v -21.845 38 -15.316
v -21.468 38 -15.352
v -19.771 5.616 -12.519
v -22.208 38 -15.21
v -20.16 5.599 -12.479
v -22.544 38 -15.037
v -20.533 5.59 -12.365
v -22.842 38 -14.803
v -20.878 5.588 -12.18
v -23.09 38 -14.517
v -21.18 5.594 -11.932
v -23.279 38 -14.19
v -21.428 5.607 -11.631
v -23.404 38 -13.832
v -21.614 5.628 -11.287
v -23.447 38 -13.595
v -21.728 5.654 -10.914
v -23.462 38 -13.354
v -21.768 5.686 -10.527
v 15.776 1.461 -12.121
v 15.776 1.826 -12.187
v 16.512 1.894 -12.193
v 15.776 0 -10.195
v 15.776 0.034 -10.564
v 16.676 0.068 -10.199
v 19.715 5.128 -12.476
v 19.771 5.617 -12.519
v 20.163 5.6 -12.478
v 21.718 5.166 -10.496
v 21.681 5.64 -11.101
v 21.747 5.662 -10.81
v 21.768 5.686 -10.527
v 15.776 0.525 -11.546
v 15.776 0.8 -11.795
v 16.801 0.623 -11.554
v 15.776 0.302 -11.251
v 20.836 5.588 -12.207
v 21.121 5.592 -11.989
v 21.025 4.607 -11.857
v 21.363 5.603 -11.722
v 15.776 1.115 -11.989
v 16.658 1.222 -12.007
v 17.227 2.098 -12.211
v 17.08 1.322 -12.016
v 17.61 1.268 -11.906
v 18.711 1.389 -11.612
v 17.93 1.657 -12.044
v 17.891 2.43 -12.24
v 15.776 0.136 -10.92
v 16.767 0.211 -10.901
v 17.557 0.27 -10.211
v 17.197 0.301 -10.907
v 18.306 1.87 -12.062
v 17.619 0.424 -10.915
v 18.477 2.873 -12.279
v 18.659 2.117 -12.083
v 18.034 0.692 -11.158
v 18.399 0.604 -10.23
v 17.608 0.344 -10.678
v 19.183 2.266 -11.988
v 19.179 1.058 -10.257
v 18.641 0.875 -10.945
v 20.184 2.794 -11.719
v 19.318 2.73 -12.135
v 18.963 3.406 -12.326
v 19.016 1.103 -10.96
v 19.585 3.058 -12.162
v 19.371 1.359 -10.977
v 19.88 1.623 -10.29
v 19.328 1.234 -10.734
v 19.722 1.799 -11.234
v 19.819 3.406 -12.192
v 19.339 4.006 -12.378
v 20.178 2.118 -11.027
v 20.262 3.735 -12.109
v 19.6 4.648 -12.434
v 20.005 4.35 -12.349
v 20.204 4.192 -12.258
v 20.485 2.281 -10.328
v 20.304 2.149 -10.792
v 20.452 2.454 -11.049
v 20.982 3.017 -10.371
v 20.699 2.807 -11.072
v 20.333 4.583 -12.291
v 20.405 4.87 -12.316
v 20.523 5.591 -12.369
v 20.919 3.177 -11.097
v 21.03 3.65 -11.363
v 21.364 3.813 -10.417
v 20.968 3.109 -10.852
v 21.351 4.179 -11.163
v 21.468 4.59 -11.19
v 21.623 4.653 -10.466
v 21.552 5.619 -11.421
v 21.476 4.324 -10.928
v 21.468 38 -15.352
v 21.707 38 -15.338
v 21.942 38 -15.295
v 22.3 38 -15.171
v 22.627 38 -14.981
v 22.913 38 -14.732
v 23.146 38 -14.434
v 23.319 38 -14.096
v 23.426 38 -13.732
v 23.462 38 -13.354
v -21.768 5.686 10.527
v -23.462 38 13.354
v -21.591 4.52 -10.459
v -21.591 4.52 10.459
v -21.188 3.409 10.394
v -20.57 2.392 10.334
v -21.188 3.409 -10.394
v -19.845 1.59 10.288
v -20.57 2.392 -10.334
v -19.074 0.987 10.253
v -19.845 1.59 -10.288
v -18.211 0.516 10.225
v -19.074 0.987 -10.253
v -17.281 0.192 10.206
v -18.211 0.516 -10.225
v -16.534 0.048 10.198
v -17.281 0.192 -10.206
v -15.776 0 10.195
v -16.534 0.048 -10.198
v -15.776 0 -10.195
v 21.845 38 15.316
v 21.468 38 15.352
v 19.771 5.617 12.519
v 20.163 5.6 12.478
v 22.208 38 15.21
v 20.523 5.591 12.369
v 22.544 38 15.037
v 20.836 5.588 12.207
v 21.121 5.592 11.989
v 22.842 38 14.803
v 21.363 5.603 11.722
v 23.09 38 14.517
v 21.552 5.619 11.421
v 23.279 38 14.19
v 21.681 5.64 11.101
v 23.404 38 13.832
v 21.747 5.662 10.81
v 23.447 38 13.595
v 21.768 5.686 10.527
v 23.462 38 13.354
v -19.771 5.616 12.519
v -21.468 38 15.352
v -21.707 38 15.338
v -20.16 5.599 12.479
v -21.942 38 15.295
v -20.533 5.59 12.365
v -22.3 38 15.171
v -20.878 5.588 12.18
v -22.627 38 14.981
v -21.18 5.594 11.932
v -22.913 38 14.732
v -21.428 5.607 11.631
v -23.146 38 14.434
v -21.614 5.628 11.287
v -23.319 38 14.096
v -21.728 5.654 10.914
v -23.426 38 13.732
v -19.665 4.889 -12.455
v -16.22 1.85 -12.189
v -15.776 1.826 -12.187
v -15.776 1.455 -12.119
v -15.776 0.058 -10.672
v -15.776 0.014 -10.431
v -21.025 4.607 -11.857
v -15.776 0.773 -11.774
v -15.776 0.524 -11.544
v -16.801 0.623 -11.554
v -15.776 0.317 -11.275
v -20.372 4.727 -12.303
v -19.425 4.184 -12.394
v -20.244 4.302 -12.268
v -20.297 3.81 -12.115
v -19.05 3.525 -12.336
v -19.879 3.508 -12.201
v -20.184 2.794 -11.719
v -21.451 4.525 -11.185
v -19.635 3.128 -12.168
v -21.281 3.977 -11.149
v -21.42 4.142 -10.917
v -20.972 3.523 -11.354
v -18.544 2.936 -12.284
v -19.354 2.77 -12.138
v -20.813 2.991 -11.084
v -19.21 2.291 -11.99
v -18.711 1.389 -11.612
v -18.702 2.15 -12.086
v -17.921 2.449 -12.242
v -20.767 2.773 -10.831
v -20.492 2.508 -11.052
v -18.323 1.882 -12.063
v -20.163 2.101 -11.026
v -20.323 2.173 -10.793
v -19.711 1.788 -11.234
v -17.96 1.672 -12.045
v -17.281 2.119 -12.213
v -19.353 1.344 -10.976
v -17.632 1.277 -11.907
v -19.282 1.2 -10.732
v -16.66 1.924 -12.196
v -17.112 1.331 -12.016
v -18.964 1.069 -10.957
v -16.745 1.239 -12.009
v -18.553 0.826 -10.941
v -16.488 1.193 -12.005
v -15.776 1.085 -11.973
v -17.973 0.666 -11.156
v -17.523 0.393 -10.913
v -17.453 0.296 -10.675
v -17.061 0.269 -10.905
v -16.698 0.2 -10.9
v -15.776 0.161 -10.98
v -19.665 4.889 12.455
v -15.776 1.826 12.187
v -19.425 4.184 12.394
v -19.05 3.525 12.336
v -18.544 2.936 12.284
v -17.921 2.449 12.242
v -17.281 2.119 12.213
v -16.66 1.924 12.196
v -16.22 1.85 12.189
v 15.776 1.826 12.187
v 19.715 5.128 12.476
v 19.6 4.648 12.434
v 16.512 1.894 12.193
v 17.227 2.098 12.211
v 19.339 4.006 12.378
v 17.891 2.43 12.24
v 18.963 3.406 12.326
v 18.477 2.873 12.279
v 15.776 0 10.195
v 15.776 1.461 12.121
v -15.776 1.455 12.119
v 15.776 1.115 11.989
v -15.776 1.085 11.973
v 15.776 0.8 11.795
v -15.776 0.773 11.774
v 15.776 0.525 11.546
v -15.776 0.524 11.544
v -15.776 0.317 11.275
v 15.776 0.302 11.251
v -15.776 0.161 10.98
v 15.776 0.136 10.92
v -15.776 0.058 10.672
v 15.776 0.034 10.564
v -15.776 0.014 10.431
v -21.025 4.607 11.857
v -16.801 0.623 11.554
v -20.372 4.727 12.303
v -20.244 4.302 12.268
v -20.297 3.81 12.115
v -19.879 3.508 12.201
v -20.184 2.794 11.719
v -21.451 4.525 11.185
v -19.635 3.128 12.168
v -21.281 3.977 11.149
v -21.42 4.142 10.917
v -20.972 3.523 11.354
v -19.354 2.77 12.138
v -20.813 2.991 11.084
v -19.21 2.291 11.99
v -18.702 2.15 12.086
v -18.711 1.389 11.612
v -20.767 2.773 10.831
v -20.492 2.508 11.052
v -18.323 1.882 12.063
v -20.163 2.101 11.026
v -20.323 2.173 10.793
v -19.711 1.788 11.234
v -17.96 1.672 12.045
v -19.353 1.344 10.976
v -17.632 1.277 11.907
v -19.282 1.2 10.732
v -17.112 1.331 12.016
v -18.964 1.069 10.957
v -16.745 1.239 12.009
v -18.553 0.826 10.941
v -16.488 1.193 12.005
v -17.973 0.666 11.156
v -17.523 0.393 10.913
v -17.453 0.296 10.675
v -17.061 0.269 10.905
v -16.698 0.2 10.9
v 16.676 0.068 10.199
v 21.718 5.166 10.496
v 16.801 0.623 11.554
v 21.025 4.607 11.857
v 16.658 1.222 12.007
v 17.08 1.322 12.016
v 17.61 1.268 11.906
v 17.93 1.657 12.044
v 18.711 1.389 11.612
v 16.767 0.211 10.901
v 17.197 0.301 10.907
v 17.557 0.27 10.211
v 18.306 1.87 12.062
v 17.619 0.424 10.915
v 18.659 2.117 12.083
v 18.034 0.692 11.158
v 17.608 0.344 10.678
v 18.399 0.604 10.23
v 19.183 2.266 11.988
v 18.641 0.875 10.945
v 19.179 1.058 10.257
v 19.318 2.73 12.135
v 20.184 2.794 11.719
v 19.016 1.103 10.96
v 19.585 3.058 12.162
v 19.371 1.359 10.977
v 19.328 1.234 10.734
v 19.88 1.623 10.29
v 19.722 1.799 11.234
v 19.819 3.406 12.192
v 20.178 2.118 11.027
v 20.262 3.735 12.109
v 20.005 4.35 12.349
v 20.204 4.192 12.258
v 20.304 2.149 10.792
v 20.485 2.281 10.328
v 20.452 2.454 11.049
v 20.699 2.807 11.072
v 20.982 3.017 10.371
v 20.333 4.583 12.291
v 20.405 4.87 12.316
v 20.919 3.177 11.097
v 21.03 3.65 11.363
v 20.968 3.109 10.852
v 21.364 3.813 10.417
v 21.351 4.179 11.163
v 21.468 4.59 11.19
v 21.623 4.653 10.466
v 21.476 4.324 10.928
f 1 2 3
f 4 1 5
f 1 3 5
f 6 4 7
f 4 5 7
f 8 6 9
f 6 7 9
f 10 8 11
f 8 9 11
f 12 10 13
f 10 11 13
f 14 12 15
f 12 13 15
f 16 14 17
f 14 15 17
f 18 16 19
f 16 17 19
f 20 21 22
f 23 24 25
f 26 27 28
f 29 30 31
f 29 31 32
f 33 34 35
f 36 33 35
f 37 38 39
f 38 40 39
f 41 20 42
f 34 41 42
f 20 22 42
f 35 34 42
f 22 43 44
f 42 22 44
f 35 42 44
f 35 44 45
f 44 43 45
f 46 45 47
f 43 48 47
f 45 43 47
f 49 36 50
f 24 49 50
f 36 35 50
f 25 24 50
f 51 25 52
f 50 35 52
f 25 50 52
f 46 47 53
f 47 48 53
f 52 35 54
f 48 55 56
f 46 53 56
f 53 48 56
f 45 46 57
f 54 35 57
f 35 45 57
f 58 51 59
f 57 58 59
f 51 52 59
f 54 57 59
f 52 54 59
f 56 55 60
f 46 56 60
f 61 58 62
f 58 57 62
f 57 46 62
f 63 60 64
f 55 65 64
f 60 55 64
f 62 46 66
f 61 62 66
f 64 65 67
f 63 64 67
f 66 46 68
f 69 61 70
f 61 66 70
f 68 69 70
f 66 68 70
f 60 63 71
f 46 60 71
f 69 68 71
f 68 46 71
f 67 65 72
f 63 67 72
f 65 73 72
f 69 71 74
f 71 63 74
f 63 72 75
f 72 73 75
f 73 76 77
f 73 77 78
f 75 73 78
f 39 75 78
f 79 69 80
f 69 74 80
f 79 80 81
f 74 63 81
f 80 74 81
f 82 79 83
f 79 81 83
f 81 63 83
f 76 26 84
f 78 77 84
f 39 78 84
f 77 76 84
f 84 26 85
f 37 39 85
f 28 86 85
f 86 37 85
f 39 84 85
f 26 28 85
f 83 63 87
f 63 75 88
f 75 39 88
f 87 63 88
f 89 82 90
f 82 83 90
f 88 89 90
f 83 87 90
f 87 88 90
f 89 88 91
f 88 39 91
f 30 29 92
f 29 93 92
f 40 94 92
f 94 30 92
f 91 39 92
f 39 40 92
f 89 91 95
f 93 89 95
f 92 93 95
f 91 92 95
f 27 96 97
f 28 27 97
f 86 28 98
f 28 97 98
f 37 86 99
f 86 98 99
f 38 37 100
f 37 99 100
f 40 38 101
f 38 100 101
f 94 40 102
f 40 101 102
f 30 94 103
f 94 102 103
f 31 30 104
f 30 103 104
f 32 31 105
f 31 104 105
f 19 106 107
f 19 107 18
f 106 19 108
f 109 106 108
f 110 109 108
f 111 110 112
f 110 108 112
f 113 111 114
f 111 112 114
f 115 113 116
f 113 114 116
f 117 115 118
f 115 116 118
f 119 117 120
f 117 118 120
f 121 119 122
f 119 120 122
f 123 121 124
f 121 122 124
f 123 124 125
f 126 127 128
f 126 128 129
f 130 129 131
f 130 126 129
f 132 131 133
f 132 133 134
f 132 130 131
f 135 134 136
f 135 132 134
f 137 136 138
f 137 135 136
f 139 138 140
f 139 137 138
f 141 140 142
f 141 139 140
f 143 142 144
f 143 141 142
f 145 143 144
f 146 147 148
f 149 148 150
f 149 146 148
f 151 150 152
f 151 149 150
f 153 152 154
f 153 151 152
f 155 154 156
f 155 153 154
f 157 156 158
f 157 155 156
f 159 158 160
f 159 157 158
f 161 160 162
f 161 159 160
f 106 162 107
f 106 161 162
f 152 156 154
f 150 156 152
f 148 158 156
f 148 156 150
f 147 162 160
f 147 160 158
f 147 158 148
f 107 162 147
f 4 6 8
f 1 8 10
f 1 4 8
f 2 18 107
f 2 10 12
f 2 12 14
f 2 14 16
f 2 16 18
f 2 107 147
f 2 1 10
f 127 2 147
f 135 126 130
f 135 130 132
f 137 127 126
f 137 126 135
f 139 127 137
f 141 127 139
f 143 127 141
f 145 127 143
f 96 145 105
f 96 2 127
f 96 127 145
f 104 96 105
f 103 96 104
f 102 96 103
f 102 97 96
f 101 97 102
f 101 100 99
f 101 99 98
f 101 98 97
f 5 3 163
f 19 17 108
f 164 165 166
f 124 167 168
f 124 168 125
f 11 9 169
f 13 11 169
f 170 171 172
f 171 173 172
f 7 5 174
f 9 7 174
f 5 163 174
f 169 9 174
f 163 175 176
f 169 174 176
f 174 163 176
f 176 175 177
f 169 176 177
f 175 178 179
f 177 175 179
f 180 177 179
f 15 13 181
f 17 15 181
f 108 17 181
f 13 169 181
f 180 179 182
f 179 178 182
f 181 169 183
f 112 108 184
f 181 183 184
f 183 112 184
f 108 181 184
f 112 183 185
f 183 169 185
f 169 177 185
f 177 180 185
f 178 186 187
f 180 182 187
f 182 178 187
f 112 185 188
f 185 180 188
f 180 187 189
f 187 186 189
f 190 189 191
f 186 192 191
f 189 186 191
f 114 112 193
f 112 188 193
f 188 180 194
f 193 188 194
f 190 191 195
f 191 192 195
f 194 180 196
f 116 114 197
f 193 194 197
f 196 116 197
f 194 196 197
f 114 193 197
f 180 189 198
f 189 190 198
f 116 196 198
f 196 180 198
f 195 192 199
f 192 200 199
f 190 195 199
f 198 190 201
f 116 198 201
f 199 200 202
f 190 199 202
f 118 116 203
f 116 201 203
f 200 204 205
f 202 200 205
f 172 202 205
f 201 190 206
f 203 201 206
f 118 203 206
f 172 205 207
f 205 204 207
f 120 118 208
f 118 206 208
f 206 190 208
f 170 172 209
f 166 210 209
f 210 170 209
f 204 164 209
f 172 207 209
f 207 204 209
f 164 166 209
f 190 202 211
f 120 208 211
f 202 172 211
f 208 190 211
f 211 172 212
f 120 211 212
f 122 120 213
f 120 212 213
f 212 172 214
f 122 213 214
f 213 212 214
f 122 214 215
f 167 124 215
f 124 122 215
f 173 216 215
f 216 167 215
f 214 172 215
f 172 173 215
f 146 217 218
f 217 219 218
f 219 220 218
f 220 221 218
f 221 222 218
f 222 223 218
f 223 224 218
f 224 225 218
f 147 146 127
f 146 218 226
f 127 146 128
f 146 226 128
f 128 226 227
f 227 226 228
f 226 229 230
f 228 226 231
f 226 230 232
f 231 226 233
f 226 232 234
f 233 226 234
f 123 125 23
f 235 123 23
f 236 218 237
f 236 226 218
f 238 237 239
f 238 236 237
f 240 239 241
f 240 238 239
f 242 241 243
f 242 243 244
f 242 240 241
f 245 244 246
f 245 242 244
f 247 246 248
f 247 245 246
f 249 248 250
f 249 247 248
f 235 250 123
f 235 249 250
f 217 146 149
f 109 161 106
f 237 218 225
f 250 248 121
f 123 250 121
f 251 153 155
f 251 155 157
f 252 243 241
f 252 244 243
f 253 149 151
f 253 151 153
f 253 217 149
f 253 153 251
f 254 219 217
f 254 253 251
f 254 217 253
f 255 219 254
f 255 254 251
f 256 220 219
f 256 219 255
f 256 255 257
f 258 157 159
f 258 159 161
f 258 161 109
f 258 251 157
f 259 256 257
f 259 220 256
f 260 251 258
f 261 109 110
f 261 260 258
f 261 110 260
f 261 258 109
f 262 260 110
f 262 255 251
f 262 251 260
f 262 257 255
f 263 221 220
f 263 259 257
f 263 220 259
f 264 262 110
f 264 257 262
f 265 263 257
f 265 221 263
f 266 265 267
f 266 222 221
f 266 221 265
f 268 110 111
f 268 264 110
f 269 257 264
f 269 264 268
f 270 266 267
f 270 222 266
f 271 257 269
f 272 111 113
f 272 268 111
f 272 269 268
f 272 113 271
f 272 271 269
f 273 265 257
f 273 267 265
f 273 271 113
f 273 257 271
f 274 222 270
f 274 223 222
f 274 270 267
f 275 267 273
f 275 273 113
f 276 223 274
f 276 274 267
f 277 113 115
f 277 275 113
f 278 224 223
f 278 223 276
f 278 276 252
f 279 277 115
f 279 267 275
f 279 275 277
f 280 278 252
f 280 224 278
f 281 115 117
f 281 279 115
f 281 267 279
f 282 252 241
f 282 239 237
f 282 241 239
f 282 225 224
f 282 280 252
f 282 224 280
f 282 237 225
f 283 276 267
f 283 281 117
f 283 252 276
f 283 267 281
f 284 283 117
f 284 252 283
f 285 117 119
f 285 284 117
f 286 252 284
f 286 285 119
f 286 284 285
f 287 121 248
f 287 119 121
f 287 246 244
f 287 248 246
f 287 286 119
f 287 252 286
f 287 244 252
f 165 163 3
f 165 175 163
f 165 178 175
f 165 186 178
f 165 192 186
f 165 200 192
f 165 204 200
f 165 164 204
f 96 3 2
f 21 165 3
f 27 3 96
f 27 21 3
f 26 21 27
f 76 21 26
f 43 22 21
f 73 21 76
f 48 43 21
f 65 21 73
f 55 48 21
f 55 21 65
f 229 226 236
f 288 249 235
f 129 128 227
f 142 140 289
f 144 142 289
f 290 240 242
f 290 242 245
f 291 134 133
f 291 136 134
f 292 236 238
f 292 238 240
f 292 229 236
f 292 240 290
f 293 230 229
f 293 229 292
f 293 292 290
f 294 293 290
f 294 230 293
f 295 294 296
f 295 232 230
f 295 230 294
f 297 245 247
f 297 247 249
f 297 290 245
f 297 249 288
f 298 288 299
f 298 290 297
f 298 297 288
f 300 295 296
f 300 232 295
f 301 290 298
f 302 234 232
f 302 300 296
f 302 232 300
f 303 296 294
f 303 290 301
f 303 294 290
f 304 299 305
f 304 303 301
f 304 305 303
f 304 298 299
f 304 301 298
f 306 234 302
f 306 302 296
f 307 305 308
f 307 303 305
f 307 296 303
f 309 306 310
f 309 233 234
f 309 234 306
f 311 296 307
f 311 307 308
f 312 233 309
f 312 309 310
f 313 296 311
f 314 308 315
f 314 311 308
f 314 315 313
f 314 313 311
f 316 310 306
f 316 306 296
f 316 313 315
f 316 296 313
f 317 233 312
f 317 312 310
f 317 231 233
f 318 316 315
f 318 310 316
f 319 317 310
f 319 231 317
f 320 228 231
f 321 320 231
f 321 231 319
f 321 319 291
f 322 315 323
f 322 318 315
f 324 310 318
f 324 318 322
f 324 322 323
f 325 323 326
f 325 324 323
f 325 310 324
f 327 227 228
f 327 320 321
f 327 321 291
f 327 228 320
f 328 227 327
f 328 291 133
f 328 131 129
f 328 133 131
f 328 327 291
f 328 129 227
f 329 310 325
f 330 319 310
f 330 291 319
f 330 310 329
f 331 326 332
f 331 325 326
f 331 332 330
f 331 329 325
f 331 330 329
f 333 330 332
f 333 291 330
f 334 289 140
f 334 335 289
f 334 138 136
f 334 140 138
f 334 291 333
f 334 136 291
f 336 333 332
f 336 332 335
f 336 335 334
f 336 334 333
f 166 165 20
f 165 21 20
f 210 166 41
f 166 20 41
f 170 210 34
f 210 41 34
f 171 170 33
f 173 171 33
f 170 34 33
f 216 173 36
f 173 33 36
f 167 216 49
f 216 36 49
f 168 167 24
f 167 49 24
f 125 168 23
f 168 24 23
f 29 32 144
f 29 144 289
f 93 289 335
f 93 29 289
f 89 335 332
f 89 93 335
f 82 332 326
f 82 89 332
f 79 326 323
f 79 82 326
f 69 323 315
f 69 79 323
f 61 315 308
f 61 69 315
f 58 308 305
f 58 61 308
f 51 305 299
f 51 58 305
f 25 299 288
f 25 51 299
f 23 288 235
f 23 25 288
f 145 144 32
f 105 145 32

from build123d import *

# Parameters (mm, degrees)
SKETCH2_W           = 47.5
SKETCH2_H           = 31.66666
BOSS_EXTRUDE1_DEPTH = 43.5
DRAFT2_ANGLE        = -5
DRAFT3_ANGLE        = -5
DRAFT4_ANGLE        = -3
DRAFT5_ANGLE        = -3
FILLET1_R           = 6
FILLET2_R           = 2
SKETCH3_W           = 65.927175626
SKETCH3_H           = 41.406577606
CUT_EXTRUDE1_DEPTH  = 5.5


with BuildPart() as part:
    # Sketch2 → Boss-Extrude1 (new body)
    with BuildSketch(Plane(origin=(0, 0, 0), x_dir=(1, 0, 0), z_dir=(0, 1, 0))):
        Rectangle(SKETCH2_W, SKETCH2_H)
    extrude(amount=BOSS_EXTRUDE1_DEPTH)

    # Draft2
    draft2_faces = [part.faces().sort_by_distance(p)[0] for p in [
        (0, 21.75, 15.83333),
    ]]
    draft(draft2_faces, Plane.ZX.offset(43.5), DRAFT2_ANGLE)

    # Draft3
    draft3_faces = [part.faces().sort_by_distance(p)[0] for p in [
        (0, 21.75, -15.83333),
    ]]
    draft(draft3_faces, Plane.ZX.offset(43.5), DRAFT3_ANGLE)

    # Draft4
    draft4_faces = [part.faces().sort_by_distance(p)[0] for p in [
        (-23.75, 22.740338939, 0),
    ]]
    draft(draft4_faces, Plane.ZX.offset(43.5), DRAFT4_ANGLE)

    # Draft5
    draft5_faces = [part.faces().sort_by_distance(p)[0] for p in [
        (23.75, 22.740338939, 0),
    ]]
    draft(draft5_faces, Plane.ZX.offset(43.5), DRAFT5_ANGLE)

    # Fillet1
    fillet1_edges = [part.edges().sort_by_distance(p)[0] for p in [
        (21.470261601, 0, 0),
        (-21.470261601, 0, 0),
    ]]
    fillet(fillet1_edges, radius=FILLET1_R)

    # Fillet2
    fillet2_edges = [part.edges().sort_by_distance(p)[0] for p in [
        (23.75, 43.5, 0),
        (0, 43.5, -15.83333),
        (0, 0, 12.027573137),
        (19.910526358, 1.651481544, 12.17205905),
        (-19.910526358, 1.651481544, 12.17205905),
        (0, 0, -12.027573137),
        (19.910526358, 1.651481544, -12.17205905),
        (-19.910526358, 1.651481544, -12.17205905),
        (-23.75, 43.5, 0),
        (0, 43.5, 15.83333),
        (-22.759125705, 24.592992131, -14.17918115),
        (22.759125705, 24.592992131, -14.17918115),
        (22.759125705, 24.592992131, 14.17918115),
        (-22.759125705, 24.592992131, 14.17918115),
    ]]
    fillet(fillet2_edges, radius=FILLET2_R)

    # Sketch3 → Cut-Extrude1 (cut)
    with BuildSketch(Plane(origin=(0, 43.5, 0), x_dir=(1, 0, 0), z_dir=(0, 1, 0))):
        Rectangle(SKETCH3_W, SKETCH3_H)
    extrude(amount=-CUT_EXTRUDE1_DEPTH, mode=Mode.SUBTRACT)


solid = part.part
